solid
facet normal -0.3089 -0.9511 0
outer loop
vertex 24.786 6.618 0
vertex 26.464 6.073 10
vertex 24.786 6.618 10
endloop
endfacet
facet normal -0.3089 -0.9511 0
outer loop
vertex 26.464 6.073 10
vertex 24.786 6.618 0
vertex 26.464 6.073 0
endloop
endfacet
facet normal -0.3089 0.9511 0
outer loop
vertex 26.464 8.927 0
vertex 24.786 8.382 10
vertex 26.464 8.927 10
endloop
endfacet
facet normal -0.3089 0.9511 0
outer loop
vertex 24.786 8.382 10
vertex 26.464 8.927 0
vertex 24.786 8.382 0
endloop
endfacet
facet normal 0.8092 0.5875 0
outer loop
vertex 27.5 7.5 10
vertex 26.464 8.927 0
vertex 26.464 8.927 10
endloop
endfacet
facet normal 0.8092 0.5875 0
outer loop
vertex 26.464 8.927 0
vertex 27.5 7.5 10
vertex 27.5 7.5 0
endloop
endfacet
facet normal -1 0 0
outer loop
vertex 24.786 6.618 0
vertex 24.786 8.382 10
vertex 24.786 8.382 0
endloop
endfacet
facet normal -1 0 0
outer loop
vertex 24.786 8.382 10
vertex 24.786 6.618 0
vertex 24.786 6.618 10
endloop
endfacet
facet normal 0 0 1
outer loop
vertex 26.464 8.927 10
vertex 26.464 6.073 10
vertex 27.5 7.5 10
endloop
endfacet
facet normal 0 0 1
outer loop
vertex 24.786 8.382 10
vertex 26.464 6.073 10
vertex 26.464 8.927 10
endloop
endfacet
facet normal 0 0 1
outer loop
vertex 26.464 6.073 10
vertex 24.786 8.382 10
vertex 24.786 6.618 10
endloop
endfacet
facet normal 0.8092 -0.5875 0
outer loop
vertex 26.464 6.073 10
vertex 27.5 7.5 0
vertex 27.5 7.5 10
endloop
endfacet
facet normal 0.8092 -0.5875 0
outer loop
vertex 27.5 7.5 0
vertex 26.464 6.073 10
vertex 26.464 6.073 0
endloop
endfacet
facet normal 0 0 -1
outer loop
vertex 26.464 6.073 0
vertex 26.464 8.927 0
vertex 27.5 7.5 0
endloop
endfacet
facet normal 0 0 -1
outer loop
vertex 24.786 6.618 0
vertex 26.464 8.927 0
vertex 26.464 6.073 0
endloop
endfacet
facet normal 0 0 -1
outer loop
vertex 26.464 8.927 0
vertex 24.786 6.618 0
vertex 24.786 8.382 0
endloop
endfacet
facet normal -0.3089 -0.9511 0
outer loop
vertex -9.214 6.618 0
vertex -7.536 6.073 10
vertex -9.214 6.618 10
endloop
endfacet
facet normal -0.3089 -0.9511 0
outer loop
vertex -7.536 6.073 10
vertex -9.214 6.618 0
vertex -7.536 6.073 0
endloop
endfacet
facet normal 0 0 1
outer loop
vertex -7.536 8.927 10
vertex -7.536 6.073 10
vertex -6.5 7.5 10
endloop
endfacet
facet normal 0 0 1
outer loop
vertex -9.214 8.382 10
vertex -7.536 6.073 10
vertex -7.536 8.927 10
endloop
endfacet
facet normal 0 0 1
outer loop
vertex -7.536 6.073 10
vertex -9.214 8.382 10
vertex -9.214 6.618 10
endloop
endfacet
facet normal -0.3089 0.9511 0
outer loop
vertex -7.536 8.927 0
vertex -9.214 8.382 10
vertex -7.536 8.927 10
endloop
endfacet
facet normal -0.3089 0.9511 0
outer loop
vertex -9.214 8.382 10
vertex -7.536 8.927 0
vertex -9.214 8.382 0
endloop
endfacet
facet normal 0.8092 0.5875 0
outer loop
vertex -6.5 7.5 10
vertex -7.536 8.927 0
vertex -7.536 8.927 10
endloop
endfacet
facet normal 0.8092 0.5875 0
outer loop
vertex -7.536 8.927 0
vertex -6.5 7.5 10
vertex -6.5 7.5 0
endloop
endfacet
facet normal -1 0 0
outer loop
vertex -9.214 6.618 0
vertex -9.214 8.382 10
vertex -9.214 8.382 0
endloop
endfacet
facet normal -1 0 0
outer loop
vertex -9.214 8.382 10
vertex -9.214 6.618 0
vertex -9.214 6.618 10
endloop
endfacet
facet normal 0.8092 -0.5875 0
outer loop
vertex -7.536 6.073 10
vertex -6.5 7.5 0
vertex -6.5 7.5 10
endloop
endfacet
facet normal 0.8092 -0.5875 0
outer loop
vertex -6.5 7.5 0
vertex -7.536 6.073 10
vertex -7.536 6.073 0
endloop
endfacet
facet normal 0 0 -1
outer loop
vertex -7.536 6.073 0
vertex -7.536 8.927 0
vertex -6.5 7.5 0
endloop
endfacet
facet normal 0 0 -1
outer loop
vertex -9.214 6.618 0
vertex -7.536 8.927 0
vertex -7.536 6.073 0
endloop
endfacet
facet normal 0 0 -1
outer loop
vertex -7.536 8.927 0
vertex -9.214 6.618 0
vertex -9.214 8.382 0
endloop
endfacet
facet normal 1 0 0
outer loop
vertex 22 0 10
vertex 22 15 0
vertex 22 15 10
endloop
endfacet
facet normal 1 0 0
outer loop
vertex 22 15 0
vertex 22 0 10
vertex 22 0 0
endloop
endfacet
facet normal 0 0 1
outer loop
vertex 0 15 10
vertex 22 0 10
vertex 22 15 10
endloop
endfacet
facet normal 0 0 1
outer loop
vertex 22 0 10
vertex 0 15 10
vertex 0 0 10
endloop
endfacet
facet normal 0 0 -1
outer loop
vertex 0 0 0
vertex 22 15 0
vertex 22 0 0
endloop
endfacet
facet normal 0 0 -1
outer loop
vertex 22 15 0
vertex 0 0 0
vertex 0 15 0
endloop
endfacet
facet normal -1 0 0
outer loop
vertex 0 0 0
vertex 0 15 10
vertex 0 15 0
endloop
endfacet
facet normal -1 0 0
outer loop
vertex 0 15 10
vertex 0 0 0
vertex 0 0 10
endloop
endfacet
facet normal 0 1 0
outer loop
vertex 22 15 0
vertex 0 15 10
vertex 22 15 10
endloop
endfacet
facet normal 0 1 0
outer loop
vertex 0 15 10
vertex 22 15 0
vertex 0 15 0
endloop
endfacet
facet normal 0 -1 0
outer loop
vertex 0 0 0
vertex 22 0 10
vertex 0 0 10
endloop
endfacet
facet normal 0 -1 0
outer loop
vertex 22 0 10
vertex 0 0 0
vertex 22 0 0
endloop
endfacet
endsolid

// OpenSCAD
//$fn=200;
mainHousingInsideX = 120;
mainHousingInsideY = 120;
mainHousingInsideZ = 210;
t = 3;

dispTiltOffs = 20;
dispProjHeight = 50;
dispRecess = 40;
topFoldHeight = 20;


module iecHoles(t){
    hs = 55.5-3.5;
    lc = 23;
    
    rotate(-90, [0, 0, 1]){
    translate([0, lc-hs/2, 10])
        rotate(90,[0,1,0])
            cylinder(t, 3/2,3/2, $fn=10);
    translate([0, lc+hs/2, 10])
        rotate(90,[0,1,0])
            cylinder(t, 3/2,3/2, $fn=10);
    translate()
        cube([t, 46, 20]);
    }
}

module fanHoles(t){
    
    //translate([0, lc-hs/2, 10])
        //rotate(90,[1,0,0]){
            cylinder(t, 24,24);
            translate([20, 20, 0])
                cylinder(t, 3/2, 3/2, $fn=10);
            translate([20, -20, 0])
                cylinder(t, 3/2, 3/2, $fn=10);
            translate([-20, 20, 0])
                cylinder(t, 3/2, 3/2, $fn=10);
            translate([-20, -20, 0])
                cylinder(t, 3/2, 3/2, $fn=10);
        //}
}


module displayHoles(t, r){
    $fn = 10;
    y = 55;
    x = 93;
    xo = (98-x)/2;
    yo = (60-y)/2;
    translate( [xo,yo, 0])
        cylinder(t, r, r);
    translate( [xo+x,yo, 0])
        cylinder(t, r, r);
    translate( [xo+x,yo+y, 0])
        cylinder(t, r, r);
    translate( [xo,yo+y, 0])
        cylinder(t, r, r);
}

module displayVolumes(){
    cube([98, 60, 2]);
    translate([0, 10, -2])
        cube([98, 40, 14]);
    translate([8, 60-22, -12])
        cube([52, 22, 12]);
}




module display(){
    difference(){
        displayVolumes();
        translate([0,0,-1])
        displayHoles(5);
    }
    
}


module pcb(){
    cube([100, 80, 2]);
    //Iron 0 iron 1 connector
    translate([1, -5, 2])
        cube([31, 12, 11]);
    
    //Iron 2 and iron 3 connector
    translate([100-1-31, -5, 2])
        cube([31, 12, 11]);
    
    //Power in at bottom connector
    translate([43, 3, -20])
        cube([12, 25, 20]);
    
    //Filter and voltage regulator volume
    translate([37, 2, 2])
        cube([30, 30, 20]);
    
    //Arduino volume
    translate([41, 27, 2])
        cube([18, 45, 22]);
    
    //Pin headers
    translate([35, 42, 2])
        cube([3, 30, 20]);
    translate([53, 70, 2])
        cube([11, 3, 20]);
        
    //Capacitors
    translate([12, 66, 2])    
        cylinder(13,4,4);
    translate([23, 66, 2])    
        cylinder(13,4,4);
    translate([77, 66, 2])    
        cylinder(13,4,4);
    translate([89, 66, 2])    
        cylinder(13,4,4);
    
}

module mainHousing(sx, sy, sz, t){
    fanHoleY=70;
    fanHoleZ=30;
    exhaustSeparation = 10;
    difference(){
        cube([sx, sy, sz]);
        translate([t, t, t])
            cube([sx-2*t, sy-t+1, sz-2*t]);
        translate([sx/2, sy/2+10, sz+1])
            rotate([90, 0, 0])
                fanHoles(t+2);    
        for(n = [0:15]){
            translate([sx-t-1, 20+t, 20+t+exhaustSeparation*n])
                rotate([0, 90, 0])
                    cylinder(t+2, 2.5, 2.5);
        }
    }
    
}

module mainHousingFrontPanelScrewHoles(sx, sy, sz, t){
    translate([t+10, sy+t, t+5]){
        for(n = [0:5]){
            translate([20*n, 0, 0])
                rotate([90, 0, 0])
                    cylinder(25, 1.5, 1.5);
        }
    }
    
        translate([t+10, sy+t, sz-t-5]){
        for(n = [0:5]){
            translate([20*n, 0, 0])
                rotate([90, 0, 0])
                    cylinder(25, 1.5, 1.5);
        }
    }
}


module mainHousingWithFrontPanelHoles(sx, sy, sz, t){
    difference(){
        union(){
            mainHousing(sx, sy, sz, t);
            translate([t, sy-10-t, t])
                cube([sx-2*t, 10,10]);
            translate([t, sy-10-t, sz-10-t])
                cube([sx-2*t, 10,10]);
            
        }
        mainHousingFrontPanelScrewHoles(sx, sy, sz, t);
    }
}

function getDispAngle() =
    atan2(dispProjHeight, dispRecess);

module frontPanelOnSide(height, width, t){
    //dispTiltOffs = 10;
    //dispProjHeight = 50;
    //dispRecess = 30;
    //topFoldHeight = 20;http://www.di.se/artiklar/2016/6/5/schweiz-rostar-om-medborgarlon/
    dto = dispTiltOffs;
    poly = [    [0,0],
                [dispTiltOffs,0],
                [dispProjHeight+dto,dispRecess],
                //[height,dispRecess],
                [height-topFoldHeight, dispRecess],
                [height-topFoldHeight, 0],
                [height, 0],
                [height, t],
                [height-topFoldHeight+t, t],
                
                [height-topFoldHeight+t,dispRecess+t],
    
                //[height,dispRecess+t],
                [dispProjHeight+dto,dispRecess+t],
                [dispTiltOffs,+t],
                [0,t]];
    linear_extrude(width)
        polygon(points=poly);
    
}

module placedFrontPanel(height, width, depth, t){
    /*t = 3;

dispTiltOffs = 20;
dispProjHeight = 50;
dispRecess = 40;
topFoldHeight = 20;*/
    translate([t, depth+t, t])
    
    rotate([0, -90, 180]){
        frontPanelOnSide(height, width, t);
        translate([dispProjHeight+dispTiltOffs, dispRecess+t,0])
            cube([10, 10, width]);
        translate([height-topFoldHeight-10+t, dispRecess+t,0])
            cube([10, 10, width]);
    }
}

module placedDisplay(){
translate([t+(mainHousingInsideX-98)/2, 78, 68])
    rotate(-getDispAngle(),[1, 0, 0])
        rotate([0, 0, 180])
            translate([-98,-60, 0]){
                display();
               
            }
}

module placedDisplayHoles(){
translate([t+(mainHousingInsideX-98)/2, 78, 68])
    rotate(-getDispAngle(),[1, 0, 0])
        rotate([0, 0, 180])
            translate([-98,-60, 0]){
                displayHoles(10, 3/2);
            }
}
        
module placedFrontPanelWithHoles(height, width, depth, t){
    difference(){
        placedFrontPanel(height, width, depth, t);
        placedDisplay();
        placedDisplayHoles();
        mainHousingFrontPanelScrewHoles(mainHousingInsideX+2*t, mainHousingInsideY+t, mainHousingInsideZ+2*t,t);
    }
}

module powerSupply(){
    cube([200, 100, 42]);
}


module placedPowerSupply(t){
    translate([10, 10, 3+200])
        rotate([0,90,0])
            powerSupply();
}


module penHolderMainBody(frontAngle){
    length = 110;
    height = 35;
    width = (mainHousingInsideX-2)/2;
    //frontAngle = 40;
    difference(){
    cube([width, length, height]);
    translate([0, length, 0])
        rotate([frontAngle, 0, 0])
            cube(2*[height, height, height]);
    }
}

module penHolderWithPrintHoles(angle){
    dia = 11.8;
    difference(){
        penHolderMainBody(angle);
        translate([dia, 90+2.1, dia/2])
            rotate([angle, 0, 0])
                cylinder(100 , dia/2, dia/2);
        
        translate([(mainHousingInsideX-2)/2-dia, 90+2.1, dia/2])
            rotate([angle, 0, 0])
                cylinder(100 , dia/2, dia/2);
    }
}


module penHolderDryClean(angle){
    h = 35;
    dia = 56;
    d=55;
    dt = d+h;
    angle=20;
    hd = (dia/2+2)/sqrt(2);
    difference(){
        penHolderMainBody(angle);
        
        translate([(mainHousingInsideX-2)/4, dia/2+5, 10])
            rotate([angle, 0, 0]){
                cylinder(100 , dia/2-2, dia/2-2);
                translate([0,0,13])
                    cylinder(100 , dia/2, dia/2);
                translate([hd, hd, 0])
                    cylinder(100, 3/2, 3/2);
                translate([hd, -hd, 0])
                    cylinder(100, 3/2, 3/2);
                translate([-hd, hd, 0])
                    cylinder(100, 3/2, 3/2);
                translate([-hd, -hd, 0])
                    cylinder(100, 3/2, 3/2);
                
            }

    translate([0, d, h])
        rotate([angle, 0, 0])
            translate([0, -dt, 0]){
                cube([(mainHousingInsideX-2)/2, dt, 30]);
            }
    }
    
}


module penHolder(){
    intersection(){
        penHolderDryClean(0);
        penHolderWithPrintHoles(40);
    }
}


module penHolderKnob(s){
    cylinder(5, s*30/2, s*35/2);
}

module penHolderKnobKeyHole(){
    hull(){
        penHolderKnob(1);
        translate([0,10,0])
            penHolderKnob(1.3);
    }
}

module truncatedPenHolder(){
    difference(){
    penHolder();
    translate([0,100,0])
        cube([100, 20, 20]);
    translate([0,85,0])
        cube([11,15,25]);
    translate([(mainHousingInsideX-2)/2-11,85,0])
        cube([11,15,25]);
    translate([(mainHousingInsideX-2)/4,40,0])
        penHolderKnobKeyHole();
    }
}
module printFrontPanel(){
    rotate([0, 90, 0])
    placedFrontPanelWithHoles(mainHousingInsideZ, mainHousingInsideX, mainHousingInsideY, t);
    translate([10, 120, -t-2])
        cylinder(2,20,20);
    translate([210, 120, -t-2])
        cylinder(2,20,20);
    translate([80, 120-40, -t-2])
        cylinder(2,20,20);
    translate([180, 120-40, -t-2])
        cylinder(2,20,20);
}



module multiPanelp(z){

    x = 120;
    y = x;
//    z = 3;
    ca = 15;
    cb = 15;
    b = 10;
    r = 3/2;
    t = 3;
    difference(){
        union(){
            cube([x,y,z]);
            translate([0, ca, z])
                cube([b, y-ca-cb, b]);
            translate([x-b, ca, z])
                cube([b, y-ca-cb, b]);
        }
        
        ay = ca+b/2;
        by = y/2;
        cy = y-cb-b/2;
        hy = t+b/2;
        //echo(hy)
        
        translate([-1, ay, hy])
            rotate([0, 90, 0])
                cylinder(b+2, r, r);
        translate([-1, by, hy])
            rotate([0, 90, 0])
                cylinder(b+2, r, r);
        translate([-1, cy, hy])
            rotate([0, 90, 0])
                cylinder(b+2, r, r);
        translate([x-b, 0, 0]){
            translate([-1, ay, hy])
                rotate([0, 90, 0])
                    cylinder(b+2, r, r);
            translate([-1, by, hy])
                rotate([0, 90, 0])
                    cylinder(b+2, r, r);
            translate([-1, cy, hy])
                rotate([0, 90, 0])
                    cylinder(b+2, r, r);
        }
        ax = ca+b/2;
        bx = x/2;
        cx = x -cb -b/2;
        
        /*translate([ax, hy, -1])
            cylinder(z+t+2, r, r);
        translate([bx, hy, -1])
            cylinder(z+t+2, r, r);
        translate([cx, hy, -1])
            cylinder(z+t+2, r, r);
        */
        /*translate([0, x-hy*2, 0]){
            translate([ax, hy, -1])
                cylinder(z+t+2, r, r);
            translate([bx, hy, -1])
                cylinder(z+t+2, r, r);
            translate([cx, hy, -1])
                cylinder(z+t+2, r, r);
        }*/
        
        translate([ax, hy-t, -1])
            cylinder(z+t+2, r, r);
        translate([bx, hy-t, -1])
            cylinder(z+t+2, r, r);
        translate([cx, hy-t, -1])
            cylinder(z+t+2, r, r);
        
        translate([0, x-(hy)*2+t, 0]){
            translate([ax, hy, -1])
                cylinder(z+t+2, r, r);
            translate([bx, hy, -1])
                cylinder(z+t+2, r, r);
            translate([cx, hy, -1])
                cylinder(z+t+2, r, r);
        }

    }
}

module multiPanel(){
    multiPanelp(3);
}
module multiPanelIecHole(){
    difference(){
        multiPanel();
        translate([55,43,-1])
        rotate([0,0,-17])
        rotate([-90,0,0])
        iecHoles(5);
    }
}
module wheelPanel(){
    difference(){
        multiPanel();
        translate([55,43,-1]){
            cylinder(5,8.5/2, 8.5/2);
            translate([6,0,2])
            cylinder(5,3/2, 3/2);
        }
    }
}
module backPanel(){
    
    difference(){
        multiPanel();
        translate([20,11+27,-1])
        xzCylinders(2,2, 5, 80);
    }
    
}

module fanPanel(){
    difference(){
        multiPanel();
        translate([60,60,0])
        fanHoles(3);
    }
}

module bottomPanel(){
    difference(){
        union(){
            translate([0,0,-10])
            multiPanelp(13);
            translate([35,35,3])
                cube([50,50,5]);
            //cube([120,120,10]);
        }
        
        for(i=[10:0]){
            translate([10+i*10,0,-5+3/2])
                rotate([-90,0,0])
                    cylinder(120,3,3);
        }
        
        for(i=[10:0]){
            translate([0, 10+10*i,-5+3/2])
                rotate([0,90,0])
                    cylinder(120,3,3);
        }
        //for(y=[4:0])
        //    for(x=[4:0])
        //        translate([40+10*x, 40+y*10,-5+3/2])
        //            cylinder(20,3,3);
        translate([-1, 20, 5+3])
        yxCylinders(3, 3/2, 12,80);
        translate([-1+110, 20, 5+3])
        yxCylinders(3, 3/2, 12,80);
        translate([20,5,-10])
            xzCylinders(3, 3, 10, 80);
        translate([20,115,-10])
            xzCylinders(3, 3, 10, 80);
        //translate([35+2,35+2,3])
        //        cube([46,46,50]);
        translate([60,60,-6.5])
            fanHoles(20);
    }
   
    
}



module xCylinder(h, r1, r2){
    rotate([0,90,0])
        cylinder(h,r1,r2);
}
module yCylinder(h, r1, r2){
    rotate([-90,0,0])
        cylinder(h,r1,r2);
}
module zCylinder(h, r1, r2){
    cylinder(h,r1,r2);
}

module xzCylinders(n, r, h,l){
    for(i = [0:n-1]){
        echo(i*l/(n-1));
        translate([i*l/(n-1),0,0])
            zCylinder(h,r,r);
    }
}

module xyCylinders(n, r, h,l){
    for(i = [0:n-1]){
        echo(i*l/(n-1));
        translate([i*l/(n-1),0,0])
            yCylinder(h,r,r);
    }
}

module yxCylinders(n, r, h,l){
    for(i = [0:n-1]){
        echo(i*l/(n-1));
        translate([0, i*l/(n-1),0])
            xCylinder(h,r,r);
    }
}



module frontSmall(){

    x = 120;
    y = 120;
    z = 3;
    ca = 15;
    cb = 0;
    b = 10;
    r = 3/2;
    t = 3;
    //xzCylinders(5,3,10,200);
    
    difference(){
            union(){
                cube([120,40,3]);
                translate([0, ca, z])
                    cube([b, 10, b]);
                translate([x-b, ca, z])
                    cube([b, 10, b]);
            }
            
            translate([20,5,0])
                xzCylinders(3,r, 10, 80);
            
            translate([20,35,0])
                xzCylinders(3,r, 10, 80);
            
            translate([0,20,8])
                xCylinder(10,r,r);
       
            translate([110,20,8])
                xCylinder(10,r,r);
        }
        
}


module threeHoleBarXy(){
    difference(){
        cube([90,10,10]);
        translate([5,0,5])
        xyCylinders(3,3/2, 10, 80);
    }
}

module displayPanel(){

    x = 120;
    y = 120;
    z = 3;
    ca = 15;
    cb = 0;
    b = 10;
    r = 3/2;
    t = 3;
    //xzCylinders(5,3,10,200);
    
    difference(){
            union(){
                cube([120,80,3]);
                rotate([17,0,0])
                    cube([120,10,10]);
                translate([0,71,0])
                    rotate([17,0,0])
                        cube([120,10,10]);
                /*translate([15,0,0])
                    rotate([90,0,0])
                        threeHoleBarXy();
                translate([15,70,3])
                    rotate([-17,0,0])
                        threeHoleBarXy()*/;
                //translate([0, ca, z])
                //    cube([b, 10, b]);
                //translate([x-b, ca, z])
                //    cube([b, 10, b]);
            }
            translate([15,0,0])
                rotate([17,0,0])
                    translate([5,5,-5])
                        xzCylinders(3,3/2,20,80);
            translate([15,71,0])
                rotate([17,0,0])
                    translate([5,-0.1,5])
                        xyCylinders(3,3/2,20,80);
   translate([10,10,-6]){
        displayVolumes();
            displayHoles(10,3/2);
   }
    translate([10,10,3]){
    
            displayHoles(10,4);
   }             
            
        }
 
}


module displayPanelWithDisplay(){
    displayPanel();
     translate([10,10,-6])
        displayVolumes();
}
module largeFrontPanel(){
    translate([61,(mainHousingInsideX-2)/4+1-0.5,3])
        penHolderKnob(1);
    translate([61,(mainHousingInsideX-2)/4*3+2-0.5,3])
        penHolderKnob(1);
    difference(){
        union(){
            cube([132,120,3]);
                translate([132, 15, 3])
                rotate([0,0,90])
                    threeHoleBarXy();    

            translate([0, 15, 0])
                cube([10, 90, 24]);
                //rotate([0,0,90])
                //    rotate([90,0,0])
                //    threeHoleBarXy();
        }
        translate([132-25,0,0])
            cube([25, 11, 4]);
        translate([132-25,120-11,0])
            cube([25, 11, 4]);
        cube([11,11,4]);
        translate([0,120-11,0])
            cube([11,11,4]);
    translate([5,20,0])
        rotate([0,0,90])
        xzCylinders(3,3/2,35,80);

    }

}

module pcbPillar(){
    difference(){
        union(){
            translate([18+42+5-20,10,3])
                cube([10,10,90]);
            translate([18+42-15+5,10,73])
                cube([10,10,20]);
            translate([18+42-20+5,10,73-10])
                rotate([0,22,0])
                    cube([10,10,15]);
        }
        translate([18+42-20,15,73+12])
            xCylinder(30, 3/2, 3/2);
    }
}

module holeGrid(h,r, xn, yn, xd, yd){
        for(i=[0:xn-1]){
            for(j=[0:yn-1]){
                translate([i*xd, j*yd, 0]){
                    cylinder(h,r,r);
                }
            }
        }
}

module pcbPanel(){
    difference(){
    multiPanel();
    translate([18+42,10,3])
    rotate([0,0,90])
        rotate([90,0,0])
            pcb();
        translate([50,25,-1])
            holeGrid(5,2.5,2,5,6,6);
        translate([50,25+46,-1])
            holeGrid(5,2.5,2,5,6,6);
        
        translate([20,60,-1])
            cylinder(5,14/2,14/2);
    }
    
    pcbPillar();
    translate([0,90,0])
        pcbPillar();
    
}

module pcbPanelWithPcb(){
    
    pcbPanel();
    translate([18+42,10,3])
    rotate([0,0,90])
        rotate([90,0,0])
            pcb();
    
}


module connector(){
    cube([30,12.5,9]);
    translate([0,0.5,-9])
    cube([30,6,9]);
}
module zTube(l, ri, ro){
    difference(){
        zCylinder(l,ro,ro);
        zCylinder(l, ri, ri);
    }
}

module zCone(l, ril, riu, wt){
    difference(){
        zCylinder(l,ril+wt,riu+wt);
        zCylinder(l, ril, riu);
    }
}
/*module crossOver(){
    hull(){
    cube([30,10,1]);
    translate([15,5,20]){
        zTube(1,3,4);
        translate([10,0,0])
            zTube(1,3,4);
    }}
}
*/
module connectorStrainRelief(){
    connSX = 30;
    connSY = 12.5;
    connSZ = 9;
    wall = 2.5;
    stop = 0.75;
    benReliefHeght = 20;
    transitionHeight = 20;
    cableRadius = 3.5;
    //connector();
    difference(){
        translate([-wall, -wall, -wall]){
            cube([connSX+2*wall, connSY+2*wall, connSZ+wall]);
            
        }
            cube([connSX, connSY, connSZ]);
            translate([stop*0,0*stop,-wall])
            cube([connSX-0*2*stop, connSY-0.5*2*stop, connSZ]);
        }
    //zTube(20, 6/2, 6/2+wall);

    difference(){
        //Outer Hull
        hull(){
            translate([-wall, -wall, connSZ])
                cube([connSX+2*wall, connSY+2*wall, 1]);
            translate([-wall+(connSX+2*wall)/3, /*-wall+*/connSY/2, connSZ+transitionHeight])
                cylinder(1,cableRadius+wall,cableRadius+wall);
            translate([-wall+2*(connSX+2*wall)/3, /*-wall+*/connSY/2, connSZ+transitionHeight])
                cylinder(1,cableRadius+wall,cableRadius+wall);
        }
    
        //Inner Hull
        hull(){
            translate([0, 0, connSZ])
                cube([connSX, connSY, 1]);
            translate([-wall+(connSX+2*wall)/3, /*-wall+*/connSY/2, connSZ+transitionHeight-wall])
                cylinder(1,cableRadius,cableRadius);
            translate([-wall+2*(connSX+2*wall)/3, /*-wall+*/connSY/2, connSZ+transitionHeight-wall])
                cylinder(1,cableRadius,cableRadius);
        }
        
        translate([-wall+2*(connSX+2*wall)/3, /*-wall+*/connSY/2, connSZ+transitionHeight-wall])
            cylinder(10,cableRadius,cableRadius);
        translate([-wall+(connSX+2*wall)/3, /*-wall+*/connSY/2, connSZ+transitionHeight-wall])
            cylinder(10,cableRadius,cableRadius);
    }
    
    translate([-wall+(connSX+2*wall)/3, /*-wall+*/connSY/2, connSZ+transitionHeight])
        zTube(benReliefHeght,cableRadius,cableRadius+wall-0.5);
    translate([-wall+2*(connSX+2*wall)/3, /*-wall+*/connSY/2, connSZ+transitionHeight])
        zTube(benReliefHeght,cableRadius,cableRadius+wall-0.5);
}




module solderPenMainBody(){
    zTube(3.5,9.25/2,8.5/2+1.5);
    translate([0,0,3.5])
        zTube(50,8.5/2,8.5/2+1.5);
}

module solderPenTpuSleeveLower(){
    $fn=100;
    zTube(12, 9/2, 15/2);
    translate([0,0,12])
        zTube(20, 11/2, 15/2);
}
module solderPenTpuSleeveUpper(){
    $fn=100;
    zTube(35, 11/2, 15/2);
    translate([0,0,35])
        zCone(15, 11/2, 3.5, 2);
    translate([0,0,50])
        zCone(25, 3.5, 3.5, 2);
}
//solderPenTpuSleeveLower();
//translate([0,0,40])
//    solderPenTpuSleeveUpper();
//solderPenMainBody();
//connectorStrainRelief();
//crossOver();
//backPanel();
//pcbPanel();
//pcbPanelWithPcb();
//multiPanelIecHole();
//largeFrontPanel();
//frontSmall();

//truncatedPenHolder();
//penHolderWithPrintHoles(40);
//bottomPanel();
//wheelPanel();

//multiPanelp(10);
//fanPanel();

//
//
//displayPanel();

//xyCylinder(10,2,2);

module completeAssembly(){
//Bottom
bottomPanel();

//Bottom Back
translate([-3, 0, 3])
    rotate([90, 0, 90])
        backPanel();

//Bottom right
translate([120, 123, 3])
    rotate([90, -90, 0])
        wheelPanel();

//Bottom left 
translate([120, 0-3, 123])
    rotate([-90, 90, 0])
        multiPanelIecHole();


//Top Back
translate([-3, 0, 3+120])
    rotate([90, 0, 90])
        backPanel();

//Top right
//translate([120, 123, 3+120])
//    rotate([90, -90, 0])
//        multiPanel();

//Top left 
translate([120, 0-3, 123+120])
    rotate([-90, 90, 0])
        multiPanel();



//Top
translate([0, 120, 123+123])
    rotate([180, 0, 0])
        pcbPanel();
        
//Small panel on front at the bottom            
translate([123,0,43])
    rotate([0,-90,0])
        rotate([0,0,90])
          frontSmall();

translate([110,0,33])
    rotate([0,90-17,0])
    rotate([0,0,90])
        displayPanelWithDisplay();
        
translate([90-4,0,243])
    rotate([0,90,0])
    largeFrontPanel();

translate([89, 60-0.5, 130+100-8])
    rotate([0,90,0])
    rotate([0,0,-90])
        truncatedPenHolder();
translate([89, 120-0.5, 130+100-8])
    rotate([0,90,0])
    rotate([0,0,-90])
        truncatedPenHolder();
    }
    
    
module usbHolePattern(d){
    cube([22, 15, d]);
    translate([26, 15/2, 0]){
        cylinder(d, 3/2, 3/2);
    translate([-34, 0, 0])
        cylinder(d, 3/2, 3/2);
    }
}

usbHolePattern(10);
//completeAssembly();
//bottomPanel(); //1x
//backPanel(); //2x
//multiPanelIecHole();  //1x
//wheelPanel();  //1x
//frontSmall(); //1x
//displayPanel(); //1x
//largeFrontPanel(); /1x
//pcbPanel(); //1x
//multiPanel(); //2x
//truncatedPenHolder(); //2x
//largeFrontPanel();
//placedPowerSupply();

/*translate([-3, 0, 120])
    rotate([0, 90, 0])
        multiPanel();

//printFrontPanel();


translate([0, 73, 185])
    rotate([-90,0,0])
        penHolder();*/
//mainHousingWithFrontPanelHoles(mainHousingInsideX+2*t, mainHousingInsideY+t, mainHousingInsideZ+2*t,t);
//rotate([0, 0, -90])
//    placedFrontPanelWithHoles(mainHousingInsideZ, mainHousingInsideX, mainHousingInsideY, t);

//placedPowerSupply(t);

//placedDisplay();
